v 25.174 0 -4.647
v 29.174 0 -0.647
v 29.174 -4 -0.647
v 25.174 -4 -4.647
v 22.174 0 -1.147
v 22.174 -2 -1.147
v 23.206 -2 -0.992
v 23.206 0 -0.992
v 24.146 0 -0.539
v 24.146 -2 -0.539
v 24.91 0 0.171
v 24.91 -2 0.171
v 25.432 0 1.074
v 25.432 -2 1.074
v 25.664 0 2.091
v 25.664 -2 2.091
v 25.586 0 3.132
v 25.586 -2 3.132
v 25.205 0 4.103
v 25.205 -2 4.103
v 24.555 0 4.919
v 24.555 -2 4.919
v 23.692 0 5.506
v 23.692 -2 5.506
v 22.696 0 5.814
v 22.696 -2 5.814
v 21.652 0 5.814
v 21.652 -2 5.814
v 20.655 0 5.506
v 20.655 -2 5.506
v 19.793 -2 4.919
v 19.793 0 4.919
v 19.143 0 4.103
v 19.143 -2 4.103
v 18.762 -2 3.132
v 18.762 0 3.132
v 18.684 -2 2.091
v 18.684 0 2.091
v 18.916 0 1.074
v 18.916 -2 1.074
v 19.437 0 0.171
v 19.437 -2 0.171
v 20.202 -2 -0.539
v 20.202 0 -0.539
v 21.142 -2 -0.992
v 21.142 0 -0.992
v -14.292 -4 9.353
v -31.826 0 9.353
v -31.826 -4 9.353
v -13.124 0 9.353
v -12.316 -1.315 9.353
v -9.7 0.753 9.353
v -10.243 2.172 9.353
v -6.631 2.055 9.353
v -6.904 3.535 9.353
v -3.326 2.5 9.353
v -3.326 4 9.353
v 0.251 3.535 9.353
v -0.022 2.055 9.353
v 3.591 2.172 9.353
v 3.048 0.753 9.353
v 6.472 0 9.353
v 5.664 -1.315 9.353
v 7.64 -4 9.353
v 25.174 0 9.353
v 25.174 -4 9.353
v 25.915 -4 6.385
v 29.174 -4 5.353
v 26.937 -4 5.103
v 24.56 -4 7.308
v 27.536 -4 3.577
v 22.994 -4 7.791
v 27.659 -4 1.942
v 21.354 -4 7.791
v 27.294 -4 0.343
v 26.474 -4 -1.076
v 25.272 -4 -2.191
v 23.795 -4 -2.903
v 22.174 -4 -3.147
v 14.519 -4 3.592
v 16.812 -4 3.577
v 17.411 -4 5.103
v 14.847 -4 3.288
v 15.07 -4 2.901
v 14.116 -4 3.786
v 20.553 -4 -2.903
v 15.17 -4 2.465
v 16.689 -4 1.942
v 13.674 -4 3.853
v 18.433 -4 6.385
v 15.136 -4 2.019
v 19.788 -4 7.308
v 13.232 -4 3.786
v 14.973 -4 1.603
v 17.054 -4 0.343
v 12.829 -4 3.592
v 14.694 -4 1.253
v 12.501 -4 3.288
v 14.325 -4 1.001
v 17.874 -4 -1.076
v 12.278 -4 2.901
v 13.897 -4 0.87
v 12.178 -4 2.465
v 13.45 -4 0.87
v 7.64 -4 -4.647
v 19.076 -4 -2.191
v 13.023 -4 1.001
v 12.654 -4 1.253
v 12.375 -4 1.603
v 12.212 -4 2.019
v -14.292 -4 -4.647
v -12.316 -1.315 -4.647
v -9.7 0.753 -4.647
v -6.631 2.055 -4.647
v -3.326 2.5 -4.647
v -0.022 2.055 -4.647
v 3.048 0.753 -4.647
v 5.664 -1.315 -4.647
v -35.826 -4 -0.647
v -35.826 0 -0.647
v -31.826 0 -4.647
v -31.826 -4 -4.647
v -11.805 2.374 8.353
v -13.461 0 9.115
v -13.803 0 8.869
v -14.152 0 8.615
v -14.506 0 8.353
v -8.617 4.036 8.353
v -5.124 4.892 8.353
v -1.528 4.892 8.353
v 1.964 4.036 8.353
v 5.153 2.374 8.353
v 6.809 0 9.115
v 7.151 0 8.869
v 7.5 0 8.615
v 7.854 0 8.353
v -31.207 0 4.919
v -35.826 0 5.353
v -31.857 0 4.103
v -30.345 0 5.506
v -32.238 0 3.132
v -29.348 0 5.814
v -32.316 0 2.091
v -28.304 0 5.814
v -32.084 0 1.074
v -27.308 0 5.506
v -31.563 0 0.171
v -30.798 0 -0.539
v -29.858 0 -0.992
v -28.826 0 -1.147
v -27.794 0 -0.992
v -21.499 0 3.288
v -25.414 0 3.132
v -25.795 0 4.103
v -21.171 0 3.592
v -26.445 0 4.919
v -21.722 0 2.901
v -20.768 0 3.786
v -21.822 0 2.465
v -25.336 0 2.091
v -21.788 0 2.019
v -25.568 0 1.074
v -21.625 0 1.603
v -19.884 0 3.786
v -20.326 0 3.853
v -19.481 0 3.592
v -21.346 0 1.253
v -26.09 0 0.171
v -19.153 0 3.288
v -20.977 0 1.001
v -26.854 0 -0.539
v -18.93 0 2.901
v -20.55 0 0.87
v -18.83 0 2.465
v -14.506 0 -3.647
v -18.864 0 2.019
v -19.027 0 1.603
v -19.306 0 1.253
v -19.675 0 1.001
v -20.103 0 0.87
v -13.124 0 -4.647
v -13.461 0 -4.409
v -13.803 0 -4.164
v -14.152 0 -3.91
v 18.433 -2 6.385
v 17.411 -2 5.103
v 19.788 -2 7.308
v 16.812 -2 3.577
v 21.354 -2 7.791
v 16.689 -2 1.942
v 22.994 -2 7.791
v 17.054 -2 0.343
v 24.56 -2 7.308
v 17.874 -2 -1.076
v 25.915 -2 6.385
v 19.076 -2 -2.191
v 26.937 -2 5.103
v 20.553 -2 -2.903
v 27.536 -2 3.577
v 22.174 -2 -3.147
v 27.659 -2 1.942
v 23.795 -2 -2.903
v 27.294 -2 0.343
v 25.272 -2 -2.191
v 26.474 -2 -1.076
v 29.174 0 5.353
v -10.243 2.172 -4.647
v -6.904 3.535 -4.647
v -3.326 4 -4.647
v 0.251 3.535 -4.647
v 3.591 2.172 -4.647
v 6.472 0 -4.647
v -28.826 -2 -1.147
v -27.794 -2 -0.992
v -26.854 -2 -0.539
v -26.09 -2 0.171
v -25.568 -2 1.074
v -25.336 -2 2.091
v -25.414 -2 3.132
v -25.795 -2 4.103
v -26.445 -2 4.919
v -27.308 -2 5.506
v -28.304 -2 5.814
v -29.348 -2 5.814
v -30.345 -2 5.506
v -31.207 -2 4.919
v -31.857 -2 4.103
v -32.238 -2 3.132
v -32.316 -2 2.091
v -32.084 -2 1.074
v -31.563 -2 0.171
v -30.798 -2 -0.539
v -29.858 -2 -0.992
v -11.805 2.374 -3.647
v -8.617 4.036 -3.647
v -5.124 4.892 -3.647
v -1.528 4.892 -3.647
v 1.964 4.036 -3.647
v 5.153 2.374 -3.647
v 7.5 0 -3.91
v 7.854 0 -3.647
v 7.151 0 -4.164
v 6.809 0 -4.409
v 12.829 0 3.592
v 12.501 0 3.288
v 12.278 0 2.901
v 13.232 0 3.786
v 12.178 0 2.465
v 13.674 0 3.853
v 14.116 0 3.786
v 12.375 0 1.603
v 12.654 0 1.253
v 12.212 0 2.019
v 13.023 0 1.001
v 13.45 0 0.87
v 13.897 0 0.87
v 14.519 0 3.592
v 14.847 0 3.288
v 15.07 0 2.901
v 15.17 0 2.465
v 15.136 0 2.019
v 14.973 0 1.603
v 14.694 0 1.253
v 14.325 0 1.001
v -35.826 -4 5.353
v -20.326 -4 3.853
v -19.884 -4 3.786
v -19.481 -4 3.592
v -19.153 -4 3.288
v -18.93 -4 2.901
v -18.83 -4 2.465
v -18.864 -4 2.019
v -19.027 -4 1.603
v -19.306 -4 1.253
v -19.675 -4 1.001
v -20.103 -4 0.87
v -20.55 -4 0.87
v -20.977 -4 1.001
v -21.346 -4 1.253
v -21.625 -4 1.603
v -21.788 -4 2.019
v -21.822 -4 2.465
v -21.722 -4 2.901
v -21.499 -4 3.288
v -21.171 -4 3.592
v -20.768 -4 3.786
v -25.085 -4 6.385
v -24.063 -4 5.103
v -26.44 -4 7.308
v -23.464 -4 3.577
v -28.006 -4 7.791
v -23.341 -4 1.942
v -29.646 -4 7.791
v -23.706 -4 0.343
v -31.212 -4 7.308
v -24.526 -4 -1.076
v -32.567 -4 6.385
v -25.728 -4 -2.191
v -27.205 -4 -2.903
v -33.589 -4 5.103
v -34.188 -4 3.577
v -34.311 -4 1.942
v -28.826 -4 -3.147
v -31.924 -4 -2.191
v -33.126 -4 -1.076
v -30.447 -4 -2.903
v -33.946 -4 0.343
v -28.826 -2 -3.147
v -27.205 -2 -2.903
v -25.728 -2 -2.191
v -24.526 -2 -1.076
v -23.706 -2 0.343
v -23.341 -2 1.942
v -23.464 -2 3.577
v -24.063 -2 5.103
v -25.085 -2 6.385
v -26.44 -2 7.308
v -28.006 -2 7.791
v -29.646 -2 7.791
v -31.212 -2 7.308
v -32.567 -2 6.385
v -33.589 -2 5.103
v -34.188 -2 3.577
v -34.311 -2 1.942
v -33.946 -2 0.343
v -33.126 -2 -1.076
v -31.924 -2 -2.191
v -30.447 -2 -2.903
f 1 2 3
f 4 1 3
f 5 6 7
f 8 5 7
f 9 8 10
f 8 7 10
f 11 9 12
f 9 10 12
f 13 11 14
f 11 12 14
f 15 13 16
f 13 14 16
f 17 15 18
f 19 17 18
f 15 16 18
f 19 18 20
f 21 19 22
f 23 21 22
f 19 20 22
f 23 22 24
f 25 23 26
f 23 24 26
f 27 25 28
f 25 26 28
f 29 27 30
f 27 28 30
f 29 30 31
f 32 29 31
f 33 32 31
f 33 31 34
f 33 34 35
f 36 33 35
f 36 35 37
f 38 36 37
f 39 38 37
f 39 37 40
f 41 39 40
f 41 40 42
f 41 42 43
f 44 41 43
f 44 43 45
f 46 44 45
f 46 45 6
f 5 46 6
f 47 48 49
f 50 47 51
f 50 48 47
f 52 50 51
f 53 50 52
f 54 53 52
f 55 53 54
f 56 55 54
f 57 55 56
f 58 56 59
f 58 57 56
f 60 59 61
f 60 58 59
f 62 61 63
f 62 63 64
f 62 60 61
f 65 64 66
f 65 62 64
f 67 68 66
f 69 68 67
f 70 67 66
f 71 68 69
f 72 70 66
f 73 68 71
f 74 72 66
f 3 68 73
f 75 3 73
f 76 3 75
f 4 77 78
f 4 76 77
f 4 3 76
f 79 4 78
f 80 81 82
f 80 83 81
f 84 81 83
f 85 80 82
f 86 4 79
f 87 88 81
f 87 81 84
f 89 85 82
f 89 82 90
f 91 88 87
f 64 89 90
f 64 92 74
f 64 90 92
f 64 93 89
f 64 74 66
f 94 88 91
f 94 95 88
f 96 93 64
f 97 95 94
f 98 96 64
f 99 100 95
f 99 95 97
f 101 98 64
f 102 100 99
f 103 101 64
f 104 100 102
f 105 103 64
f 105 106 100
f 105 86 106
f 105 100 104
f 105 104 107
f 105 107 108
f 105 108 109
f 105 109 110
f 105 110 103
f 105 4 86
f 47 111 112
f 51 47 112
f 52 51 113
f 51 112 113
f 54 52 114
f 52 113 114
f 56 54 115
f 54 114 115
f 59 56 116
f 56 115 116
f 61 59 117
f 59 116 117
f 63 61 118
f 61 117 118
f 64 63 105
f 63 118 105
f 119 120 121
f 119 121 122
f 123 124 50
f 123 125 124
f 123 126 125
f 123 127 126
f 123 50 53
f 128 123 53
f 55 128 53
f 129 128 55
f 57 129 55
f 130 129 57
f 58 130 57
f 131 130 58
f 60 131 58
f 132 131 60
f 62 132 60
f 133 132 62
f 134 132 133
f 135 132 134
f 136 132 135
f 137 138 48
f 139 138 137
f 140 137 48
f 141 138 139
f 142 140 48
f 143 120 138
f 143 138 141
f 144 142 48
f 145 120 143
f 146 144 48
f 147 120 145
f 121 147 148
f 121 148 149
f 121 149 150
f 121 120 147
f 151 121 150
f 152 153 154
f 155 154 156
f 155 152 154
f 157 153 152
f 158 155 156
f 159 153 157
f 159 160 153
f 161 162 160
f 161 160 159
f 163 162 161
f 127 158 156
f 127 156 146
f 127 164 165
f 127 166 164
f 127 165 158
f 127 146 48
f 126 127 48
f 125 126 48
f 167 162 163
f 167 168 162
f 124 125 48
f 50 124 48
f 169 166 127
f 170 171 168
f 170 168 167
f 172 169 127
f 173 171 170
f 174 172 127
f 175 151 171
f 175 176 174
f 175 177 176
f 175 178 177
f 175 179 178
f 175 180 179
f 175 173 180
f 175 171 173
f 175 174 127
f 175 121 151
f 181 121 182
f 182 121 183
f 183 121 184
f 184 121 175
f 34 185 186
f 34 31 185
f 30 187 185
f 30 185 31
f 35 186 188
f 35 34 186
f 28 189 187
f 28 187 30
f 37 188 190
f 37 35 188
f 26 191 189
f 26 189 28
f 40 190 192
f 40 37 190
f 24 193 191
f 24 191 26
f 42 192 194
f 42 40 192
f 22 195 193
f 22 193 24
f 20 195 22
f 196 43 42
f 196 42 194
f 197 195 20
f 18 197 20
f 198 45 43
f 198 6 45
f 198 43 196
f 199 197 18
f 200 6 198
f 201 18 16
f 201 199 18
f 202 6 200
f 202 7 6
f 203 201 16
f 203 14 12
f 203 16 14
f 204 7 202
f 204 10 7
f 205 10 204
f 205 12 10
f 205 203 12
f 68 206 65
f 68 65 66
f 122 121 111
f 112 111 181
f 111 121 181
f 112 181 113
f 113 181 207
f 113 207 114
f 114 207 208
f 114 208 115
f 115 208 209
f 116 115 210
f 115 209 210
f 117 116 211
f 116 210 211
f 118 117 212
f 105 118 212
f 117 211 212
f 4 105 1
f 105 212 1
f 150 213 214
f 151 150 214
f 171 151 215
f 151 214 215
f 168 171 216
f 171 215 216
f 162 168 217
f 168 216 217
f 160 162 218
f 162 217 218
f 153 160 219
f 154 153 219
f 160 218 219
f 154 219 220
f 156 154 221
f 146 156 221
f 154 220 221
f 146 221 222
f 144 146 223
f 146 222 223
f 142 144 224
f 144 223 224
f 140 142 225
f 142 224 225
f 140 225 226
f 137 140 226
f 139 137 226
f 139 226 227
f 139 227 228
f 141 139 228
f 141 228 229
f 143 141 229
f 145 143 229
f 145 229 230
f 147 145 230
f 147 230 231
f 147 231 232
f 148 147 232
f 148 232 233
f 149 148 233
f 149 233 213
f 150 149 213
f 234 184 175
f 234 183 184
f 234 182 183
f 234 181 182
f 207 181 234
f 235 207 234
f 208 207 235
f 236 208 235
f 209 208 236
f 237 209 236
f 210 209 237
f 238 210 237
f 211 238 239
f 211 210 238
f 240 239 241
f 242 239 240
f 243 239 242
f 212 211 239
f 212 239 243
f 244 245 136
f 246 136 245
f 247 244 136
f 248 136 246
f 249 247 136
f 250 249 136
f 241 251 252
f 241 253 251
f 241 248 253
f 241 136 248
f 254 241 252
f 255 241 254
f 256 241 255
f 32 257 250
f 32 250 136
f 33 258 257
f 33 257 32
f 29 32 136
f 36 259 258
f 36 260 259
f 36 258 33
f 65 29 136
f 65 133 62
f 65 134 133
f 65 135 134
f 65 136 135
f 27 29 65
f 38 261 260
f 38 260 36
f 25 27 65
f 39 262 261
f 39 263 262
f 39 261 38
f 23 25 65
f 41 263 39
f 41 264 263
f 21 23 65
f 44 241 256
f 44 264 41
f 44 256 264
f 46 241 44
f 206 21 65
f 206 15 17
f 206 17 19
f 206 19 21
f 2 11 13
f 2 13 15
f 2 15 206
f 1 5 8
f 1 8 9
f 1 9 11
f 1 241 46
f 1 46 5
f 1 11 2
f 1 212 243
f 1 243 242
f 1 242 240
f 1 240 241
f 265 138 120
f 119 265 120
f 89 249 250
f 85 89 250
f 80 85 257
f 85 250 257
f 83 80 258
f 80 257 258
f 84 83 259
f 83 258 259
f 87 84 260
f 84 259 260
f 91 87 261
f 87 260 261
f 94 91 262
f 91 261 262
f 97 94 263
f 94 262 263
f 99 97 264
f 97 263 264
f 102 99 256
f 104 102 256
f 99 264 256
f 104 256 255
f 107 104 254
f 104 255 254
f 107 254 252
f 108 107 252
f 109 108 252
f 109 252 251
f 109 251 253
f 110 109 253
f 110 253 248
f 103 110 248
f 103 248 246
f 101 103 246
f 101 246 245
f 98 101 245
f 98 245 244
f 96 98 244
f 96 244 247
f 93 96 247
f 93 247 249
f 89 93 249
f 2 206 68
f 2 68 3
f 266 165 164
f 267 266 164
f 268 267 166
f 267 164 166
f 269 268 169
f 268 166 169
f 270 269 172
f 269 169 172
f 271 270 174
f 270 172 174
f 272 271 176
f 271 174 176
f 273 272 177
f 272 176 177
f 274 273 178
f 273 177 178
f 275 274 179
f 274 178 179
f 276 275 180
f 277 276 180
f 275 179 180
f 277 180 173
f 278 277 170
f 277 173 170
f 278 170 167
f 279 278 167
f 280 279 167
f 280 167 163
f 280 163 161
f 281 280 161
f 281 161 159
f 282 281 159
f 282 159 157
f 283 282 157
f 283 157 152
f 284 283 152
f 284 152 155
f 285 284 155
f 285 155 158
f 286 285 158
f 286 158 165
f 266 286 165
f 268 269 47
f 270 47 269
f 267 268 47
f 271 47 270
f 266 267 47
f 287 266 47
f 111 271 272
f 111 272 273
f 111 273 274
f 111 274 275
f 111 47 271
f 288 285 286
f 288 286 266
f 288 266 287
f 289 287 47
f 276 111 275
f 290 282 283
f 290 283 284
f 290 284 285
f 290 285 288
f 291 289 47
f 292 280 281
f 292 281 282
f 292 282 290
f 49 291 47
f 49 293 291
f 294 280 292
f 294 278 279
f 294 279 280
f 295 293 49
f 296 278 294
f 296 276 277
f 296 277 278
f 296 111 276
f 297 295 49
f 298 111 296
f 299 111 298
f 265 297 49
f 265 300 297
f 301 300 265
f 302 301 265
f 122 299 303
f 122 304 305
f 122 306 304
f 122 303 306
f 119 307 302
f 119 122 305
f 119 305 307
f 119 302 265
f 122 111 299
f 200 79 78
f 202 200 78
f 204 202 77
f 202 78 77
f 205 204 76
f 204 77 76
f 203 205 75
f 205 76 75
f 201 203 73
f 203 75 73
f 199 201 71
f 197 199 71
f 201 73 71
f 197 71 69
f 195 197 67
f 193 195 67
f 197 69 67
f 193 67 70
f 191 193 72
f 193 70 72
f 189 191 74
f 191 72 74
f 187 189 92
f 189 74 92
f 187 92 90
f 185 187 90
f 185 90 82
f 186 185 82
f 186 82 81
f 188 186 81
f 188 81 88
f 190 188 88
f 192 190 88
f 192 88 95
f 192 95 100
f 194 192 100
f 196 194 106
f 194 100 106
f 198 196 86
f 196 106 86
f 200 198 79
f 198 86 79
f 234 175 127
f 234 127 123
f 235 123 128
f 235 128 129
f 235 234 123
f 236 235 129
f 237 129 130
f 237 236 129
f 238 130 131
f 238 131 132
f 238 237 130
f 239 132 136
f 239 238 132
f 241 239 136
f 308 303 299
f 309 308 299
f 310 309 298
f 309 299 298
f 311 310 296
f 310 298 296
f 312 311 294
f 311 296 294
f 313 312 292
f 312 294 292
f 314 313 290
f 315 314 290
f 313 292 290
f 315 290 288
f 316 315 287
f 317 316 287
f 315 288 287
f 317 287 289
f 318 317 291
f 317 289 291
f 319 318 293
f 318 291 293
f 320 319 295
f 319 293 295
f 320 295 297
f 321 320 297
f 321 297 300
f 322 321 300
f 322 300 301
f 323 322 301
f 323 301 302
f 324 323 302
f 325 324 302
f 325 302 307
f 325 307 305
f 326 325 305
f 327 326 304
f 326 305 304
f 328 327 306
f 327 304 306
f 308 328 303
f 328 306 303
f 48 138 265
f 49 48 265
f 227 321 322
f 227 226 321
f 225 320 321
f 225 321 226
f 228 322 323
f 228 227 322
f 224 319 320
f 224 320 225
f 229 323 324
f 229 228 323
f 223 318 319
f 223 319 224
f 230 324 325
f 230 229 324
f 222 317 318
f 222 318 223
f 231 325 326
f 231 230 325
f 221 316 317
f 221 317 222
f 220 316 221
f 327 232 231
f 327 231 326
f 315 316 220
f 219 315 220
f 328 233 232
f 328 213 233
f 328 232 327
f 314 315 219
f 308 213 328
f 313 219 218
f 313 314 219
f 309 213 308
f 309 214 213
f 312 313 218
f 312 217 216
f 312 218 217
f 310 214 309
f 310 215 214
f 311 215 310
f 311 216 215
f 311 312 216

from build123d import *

# Parameters (mm, degrees)
ESQUISSE2_W             = 65
ESQUISSE2_H             = 14
BOSS_EXTRU_1_DEPTH      = 4
ESQUISSE3_R             = 5.5
ENL_V_MAT_EXTRU_1_DEPTH = 2
ESQUISSE4_R             = 3.5
ENL_V_MAT_EXTRU_2_DEPTH = 38.080787511
BOSS_EXTRU_3_DEPTH      = 14
ESQUISSE7_R             = 12.5
ENL_V_MAT_EXTRU_4_DEPTH = 39.788005272
ESQUISSE8_R             = 1.5
ENL_V_MAT_EXTRU_5_DEPTH = 38.362880007
CHANFREIN1_SIZE         = 1
CHANFREIN2_SIZE         = 4


with BuildPart() as part:
    # Esquisse2 → Boss.-Extru.1 (new body)
    with BuildSketch(Plane(origin=(0, 0, 0), x_dir=(1, 0, 0), z_dir=(0, 1, 0))):
        with Locations((-3.326098768, -2.352831094)):
            Rectangle(ESQUISSE2_W, ESQUISSE2_H)
    extrude(amount=-BOSS_EXTRU_1_DEPTH)

    # Esquisse3 → Enlèv. mat.-Extru.1 (cut)
    with BuildSketch(Plane.XZ.offset(4)):
        with Locations(Location((-28.826098768, 2.352831094, 0), (0, 0, 270))):
            Circle(ESQUISSE3_R)
        with Locations(Location((22.173901232, 2.352831094, 0), (0, 0, 270))):
            Circle(ESQUISSE3_R)
    extrude(amount=-ENL_V_MAT_EXTRU_1_DEPTH, mode=Mode.SUBTRACT)

    # Esquisse4 → Enlèv. mat.-Extru.2 (cut, through all)
    with BuildSketch(Plane.XZ.offset(2)):
        with Locations(Location((-28.826098768, 2.352831094, 0), (0, 0, 270))):
            Circle(ESQUISSE4_R)
        with Locations(Location((22.173901232, 2.352831094, 0), (0, 0, 270))):
            Circle(ESQUISSE4_R)
    extrude(amount=-ENL_V_MAT_EXTRU_2_DEPTH, mode=Mode.SUBTRACT)

    # Esquisse5 → Boss.-Extru.3 (add)
    with BuildSketch(Plane(origin=(0, 0, -4.647168906), x_dir=(-1, 0, 0), z_dir=(0, 0, -1))):
        with BuildLine():
            Line((-10.421628317, -4), (17.073825853, -4))
            ThreePointArc((17.073825853, -4), (3.326098768, 5), (-10.421628317, -4))
        make_face()
    extrude(amount=-BOSS_EXTRU_3_DEPTH)

    # Esquisse7 → Enlèv. mat.-Extru.4 (cut, through all)
    with BuildSketch(Plane(origin=(0, 0, -4.647168906), x_dir=(-1, 0, 0), z_dir=(0, 0, -1))):
        with Locations((3.326098768, -10)):
            Circle(ESQUISSE7_R)
    extrude(amount=-ENL_V_MAT_EXTRU_4_DEPTH, mode=Mode.SUBTRACT)

    # Esquisse8 → Enlèv. mat.-Extru.5 (cut, through all)
    with BuildSketch(Plane(origin=(0, 0, 0), x_dir=(1, 0, 0), z_dir=(0, 1, 0))):
        with Locations(Location((-20.326098768, -2.352831094, 0), (0, 0, 270))):
            Circle(ESQUISSE8_R)
        with Locations(Location((13.673901232, -2.352831094, 0), (0, 0, 270))):
            Circle(ESQUISSE8_R)
    extrude(amount=-ENL_V_MAT_EXTRU_5_DEPTH, mode=Mode.SUBTRACT)

    # Chanfrein1
    chanfrein1_edges = [part.edges().sort_by_distance(p)[0] for p in [
        (-3.326098768, 5, 9.352831094),
        (-3.326098768, 5, -4.647168906),
    ]]
    chamfer(chanfrein1_edges, length=CHANFREIN1_SIZE)

    # Chanfrein2
    chanfrein2_edges = [part.edges().sort_by_distance(p)[0] for p in [
        (-35.826098768, -2, -4.647168906),
        (29.173901232, -2, -4.647168906),
        (29.173901232, -2, 9.352831094),
        (-35.826098768, -2, 9.352831094),
    ]]
    chamfer(chanfrein2_edges, length=CHANFREIN2_SIZE)


solid = part.part
